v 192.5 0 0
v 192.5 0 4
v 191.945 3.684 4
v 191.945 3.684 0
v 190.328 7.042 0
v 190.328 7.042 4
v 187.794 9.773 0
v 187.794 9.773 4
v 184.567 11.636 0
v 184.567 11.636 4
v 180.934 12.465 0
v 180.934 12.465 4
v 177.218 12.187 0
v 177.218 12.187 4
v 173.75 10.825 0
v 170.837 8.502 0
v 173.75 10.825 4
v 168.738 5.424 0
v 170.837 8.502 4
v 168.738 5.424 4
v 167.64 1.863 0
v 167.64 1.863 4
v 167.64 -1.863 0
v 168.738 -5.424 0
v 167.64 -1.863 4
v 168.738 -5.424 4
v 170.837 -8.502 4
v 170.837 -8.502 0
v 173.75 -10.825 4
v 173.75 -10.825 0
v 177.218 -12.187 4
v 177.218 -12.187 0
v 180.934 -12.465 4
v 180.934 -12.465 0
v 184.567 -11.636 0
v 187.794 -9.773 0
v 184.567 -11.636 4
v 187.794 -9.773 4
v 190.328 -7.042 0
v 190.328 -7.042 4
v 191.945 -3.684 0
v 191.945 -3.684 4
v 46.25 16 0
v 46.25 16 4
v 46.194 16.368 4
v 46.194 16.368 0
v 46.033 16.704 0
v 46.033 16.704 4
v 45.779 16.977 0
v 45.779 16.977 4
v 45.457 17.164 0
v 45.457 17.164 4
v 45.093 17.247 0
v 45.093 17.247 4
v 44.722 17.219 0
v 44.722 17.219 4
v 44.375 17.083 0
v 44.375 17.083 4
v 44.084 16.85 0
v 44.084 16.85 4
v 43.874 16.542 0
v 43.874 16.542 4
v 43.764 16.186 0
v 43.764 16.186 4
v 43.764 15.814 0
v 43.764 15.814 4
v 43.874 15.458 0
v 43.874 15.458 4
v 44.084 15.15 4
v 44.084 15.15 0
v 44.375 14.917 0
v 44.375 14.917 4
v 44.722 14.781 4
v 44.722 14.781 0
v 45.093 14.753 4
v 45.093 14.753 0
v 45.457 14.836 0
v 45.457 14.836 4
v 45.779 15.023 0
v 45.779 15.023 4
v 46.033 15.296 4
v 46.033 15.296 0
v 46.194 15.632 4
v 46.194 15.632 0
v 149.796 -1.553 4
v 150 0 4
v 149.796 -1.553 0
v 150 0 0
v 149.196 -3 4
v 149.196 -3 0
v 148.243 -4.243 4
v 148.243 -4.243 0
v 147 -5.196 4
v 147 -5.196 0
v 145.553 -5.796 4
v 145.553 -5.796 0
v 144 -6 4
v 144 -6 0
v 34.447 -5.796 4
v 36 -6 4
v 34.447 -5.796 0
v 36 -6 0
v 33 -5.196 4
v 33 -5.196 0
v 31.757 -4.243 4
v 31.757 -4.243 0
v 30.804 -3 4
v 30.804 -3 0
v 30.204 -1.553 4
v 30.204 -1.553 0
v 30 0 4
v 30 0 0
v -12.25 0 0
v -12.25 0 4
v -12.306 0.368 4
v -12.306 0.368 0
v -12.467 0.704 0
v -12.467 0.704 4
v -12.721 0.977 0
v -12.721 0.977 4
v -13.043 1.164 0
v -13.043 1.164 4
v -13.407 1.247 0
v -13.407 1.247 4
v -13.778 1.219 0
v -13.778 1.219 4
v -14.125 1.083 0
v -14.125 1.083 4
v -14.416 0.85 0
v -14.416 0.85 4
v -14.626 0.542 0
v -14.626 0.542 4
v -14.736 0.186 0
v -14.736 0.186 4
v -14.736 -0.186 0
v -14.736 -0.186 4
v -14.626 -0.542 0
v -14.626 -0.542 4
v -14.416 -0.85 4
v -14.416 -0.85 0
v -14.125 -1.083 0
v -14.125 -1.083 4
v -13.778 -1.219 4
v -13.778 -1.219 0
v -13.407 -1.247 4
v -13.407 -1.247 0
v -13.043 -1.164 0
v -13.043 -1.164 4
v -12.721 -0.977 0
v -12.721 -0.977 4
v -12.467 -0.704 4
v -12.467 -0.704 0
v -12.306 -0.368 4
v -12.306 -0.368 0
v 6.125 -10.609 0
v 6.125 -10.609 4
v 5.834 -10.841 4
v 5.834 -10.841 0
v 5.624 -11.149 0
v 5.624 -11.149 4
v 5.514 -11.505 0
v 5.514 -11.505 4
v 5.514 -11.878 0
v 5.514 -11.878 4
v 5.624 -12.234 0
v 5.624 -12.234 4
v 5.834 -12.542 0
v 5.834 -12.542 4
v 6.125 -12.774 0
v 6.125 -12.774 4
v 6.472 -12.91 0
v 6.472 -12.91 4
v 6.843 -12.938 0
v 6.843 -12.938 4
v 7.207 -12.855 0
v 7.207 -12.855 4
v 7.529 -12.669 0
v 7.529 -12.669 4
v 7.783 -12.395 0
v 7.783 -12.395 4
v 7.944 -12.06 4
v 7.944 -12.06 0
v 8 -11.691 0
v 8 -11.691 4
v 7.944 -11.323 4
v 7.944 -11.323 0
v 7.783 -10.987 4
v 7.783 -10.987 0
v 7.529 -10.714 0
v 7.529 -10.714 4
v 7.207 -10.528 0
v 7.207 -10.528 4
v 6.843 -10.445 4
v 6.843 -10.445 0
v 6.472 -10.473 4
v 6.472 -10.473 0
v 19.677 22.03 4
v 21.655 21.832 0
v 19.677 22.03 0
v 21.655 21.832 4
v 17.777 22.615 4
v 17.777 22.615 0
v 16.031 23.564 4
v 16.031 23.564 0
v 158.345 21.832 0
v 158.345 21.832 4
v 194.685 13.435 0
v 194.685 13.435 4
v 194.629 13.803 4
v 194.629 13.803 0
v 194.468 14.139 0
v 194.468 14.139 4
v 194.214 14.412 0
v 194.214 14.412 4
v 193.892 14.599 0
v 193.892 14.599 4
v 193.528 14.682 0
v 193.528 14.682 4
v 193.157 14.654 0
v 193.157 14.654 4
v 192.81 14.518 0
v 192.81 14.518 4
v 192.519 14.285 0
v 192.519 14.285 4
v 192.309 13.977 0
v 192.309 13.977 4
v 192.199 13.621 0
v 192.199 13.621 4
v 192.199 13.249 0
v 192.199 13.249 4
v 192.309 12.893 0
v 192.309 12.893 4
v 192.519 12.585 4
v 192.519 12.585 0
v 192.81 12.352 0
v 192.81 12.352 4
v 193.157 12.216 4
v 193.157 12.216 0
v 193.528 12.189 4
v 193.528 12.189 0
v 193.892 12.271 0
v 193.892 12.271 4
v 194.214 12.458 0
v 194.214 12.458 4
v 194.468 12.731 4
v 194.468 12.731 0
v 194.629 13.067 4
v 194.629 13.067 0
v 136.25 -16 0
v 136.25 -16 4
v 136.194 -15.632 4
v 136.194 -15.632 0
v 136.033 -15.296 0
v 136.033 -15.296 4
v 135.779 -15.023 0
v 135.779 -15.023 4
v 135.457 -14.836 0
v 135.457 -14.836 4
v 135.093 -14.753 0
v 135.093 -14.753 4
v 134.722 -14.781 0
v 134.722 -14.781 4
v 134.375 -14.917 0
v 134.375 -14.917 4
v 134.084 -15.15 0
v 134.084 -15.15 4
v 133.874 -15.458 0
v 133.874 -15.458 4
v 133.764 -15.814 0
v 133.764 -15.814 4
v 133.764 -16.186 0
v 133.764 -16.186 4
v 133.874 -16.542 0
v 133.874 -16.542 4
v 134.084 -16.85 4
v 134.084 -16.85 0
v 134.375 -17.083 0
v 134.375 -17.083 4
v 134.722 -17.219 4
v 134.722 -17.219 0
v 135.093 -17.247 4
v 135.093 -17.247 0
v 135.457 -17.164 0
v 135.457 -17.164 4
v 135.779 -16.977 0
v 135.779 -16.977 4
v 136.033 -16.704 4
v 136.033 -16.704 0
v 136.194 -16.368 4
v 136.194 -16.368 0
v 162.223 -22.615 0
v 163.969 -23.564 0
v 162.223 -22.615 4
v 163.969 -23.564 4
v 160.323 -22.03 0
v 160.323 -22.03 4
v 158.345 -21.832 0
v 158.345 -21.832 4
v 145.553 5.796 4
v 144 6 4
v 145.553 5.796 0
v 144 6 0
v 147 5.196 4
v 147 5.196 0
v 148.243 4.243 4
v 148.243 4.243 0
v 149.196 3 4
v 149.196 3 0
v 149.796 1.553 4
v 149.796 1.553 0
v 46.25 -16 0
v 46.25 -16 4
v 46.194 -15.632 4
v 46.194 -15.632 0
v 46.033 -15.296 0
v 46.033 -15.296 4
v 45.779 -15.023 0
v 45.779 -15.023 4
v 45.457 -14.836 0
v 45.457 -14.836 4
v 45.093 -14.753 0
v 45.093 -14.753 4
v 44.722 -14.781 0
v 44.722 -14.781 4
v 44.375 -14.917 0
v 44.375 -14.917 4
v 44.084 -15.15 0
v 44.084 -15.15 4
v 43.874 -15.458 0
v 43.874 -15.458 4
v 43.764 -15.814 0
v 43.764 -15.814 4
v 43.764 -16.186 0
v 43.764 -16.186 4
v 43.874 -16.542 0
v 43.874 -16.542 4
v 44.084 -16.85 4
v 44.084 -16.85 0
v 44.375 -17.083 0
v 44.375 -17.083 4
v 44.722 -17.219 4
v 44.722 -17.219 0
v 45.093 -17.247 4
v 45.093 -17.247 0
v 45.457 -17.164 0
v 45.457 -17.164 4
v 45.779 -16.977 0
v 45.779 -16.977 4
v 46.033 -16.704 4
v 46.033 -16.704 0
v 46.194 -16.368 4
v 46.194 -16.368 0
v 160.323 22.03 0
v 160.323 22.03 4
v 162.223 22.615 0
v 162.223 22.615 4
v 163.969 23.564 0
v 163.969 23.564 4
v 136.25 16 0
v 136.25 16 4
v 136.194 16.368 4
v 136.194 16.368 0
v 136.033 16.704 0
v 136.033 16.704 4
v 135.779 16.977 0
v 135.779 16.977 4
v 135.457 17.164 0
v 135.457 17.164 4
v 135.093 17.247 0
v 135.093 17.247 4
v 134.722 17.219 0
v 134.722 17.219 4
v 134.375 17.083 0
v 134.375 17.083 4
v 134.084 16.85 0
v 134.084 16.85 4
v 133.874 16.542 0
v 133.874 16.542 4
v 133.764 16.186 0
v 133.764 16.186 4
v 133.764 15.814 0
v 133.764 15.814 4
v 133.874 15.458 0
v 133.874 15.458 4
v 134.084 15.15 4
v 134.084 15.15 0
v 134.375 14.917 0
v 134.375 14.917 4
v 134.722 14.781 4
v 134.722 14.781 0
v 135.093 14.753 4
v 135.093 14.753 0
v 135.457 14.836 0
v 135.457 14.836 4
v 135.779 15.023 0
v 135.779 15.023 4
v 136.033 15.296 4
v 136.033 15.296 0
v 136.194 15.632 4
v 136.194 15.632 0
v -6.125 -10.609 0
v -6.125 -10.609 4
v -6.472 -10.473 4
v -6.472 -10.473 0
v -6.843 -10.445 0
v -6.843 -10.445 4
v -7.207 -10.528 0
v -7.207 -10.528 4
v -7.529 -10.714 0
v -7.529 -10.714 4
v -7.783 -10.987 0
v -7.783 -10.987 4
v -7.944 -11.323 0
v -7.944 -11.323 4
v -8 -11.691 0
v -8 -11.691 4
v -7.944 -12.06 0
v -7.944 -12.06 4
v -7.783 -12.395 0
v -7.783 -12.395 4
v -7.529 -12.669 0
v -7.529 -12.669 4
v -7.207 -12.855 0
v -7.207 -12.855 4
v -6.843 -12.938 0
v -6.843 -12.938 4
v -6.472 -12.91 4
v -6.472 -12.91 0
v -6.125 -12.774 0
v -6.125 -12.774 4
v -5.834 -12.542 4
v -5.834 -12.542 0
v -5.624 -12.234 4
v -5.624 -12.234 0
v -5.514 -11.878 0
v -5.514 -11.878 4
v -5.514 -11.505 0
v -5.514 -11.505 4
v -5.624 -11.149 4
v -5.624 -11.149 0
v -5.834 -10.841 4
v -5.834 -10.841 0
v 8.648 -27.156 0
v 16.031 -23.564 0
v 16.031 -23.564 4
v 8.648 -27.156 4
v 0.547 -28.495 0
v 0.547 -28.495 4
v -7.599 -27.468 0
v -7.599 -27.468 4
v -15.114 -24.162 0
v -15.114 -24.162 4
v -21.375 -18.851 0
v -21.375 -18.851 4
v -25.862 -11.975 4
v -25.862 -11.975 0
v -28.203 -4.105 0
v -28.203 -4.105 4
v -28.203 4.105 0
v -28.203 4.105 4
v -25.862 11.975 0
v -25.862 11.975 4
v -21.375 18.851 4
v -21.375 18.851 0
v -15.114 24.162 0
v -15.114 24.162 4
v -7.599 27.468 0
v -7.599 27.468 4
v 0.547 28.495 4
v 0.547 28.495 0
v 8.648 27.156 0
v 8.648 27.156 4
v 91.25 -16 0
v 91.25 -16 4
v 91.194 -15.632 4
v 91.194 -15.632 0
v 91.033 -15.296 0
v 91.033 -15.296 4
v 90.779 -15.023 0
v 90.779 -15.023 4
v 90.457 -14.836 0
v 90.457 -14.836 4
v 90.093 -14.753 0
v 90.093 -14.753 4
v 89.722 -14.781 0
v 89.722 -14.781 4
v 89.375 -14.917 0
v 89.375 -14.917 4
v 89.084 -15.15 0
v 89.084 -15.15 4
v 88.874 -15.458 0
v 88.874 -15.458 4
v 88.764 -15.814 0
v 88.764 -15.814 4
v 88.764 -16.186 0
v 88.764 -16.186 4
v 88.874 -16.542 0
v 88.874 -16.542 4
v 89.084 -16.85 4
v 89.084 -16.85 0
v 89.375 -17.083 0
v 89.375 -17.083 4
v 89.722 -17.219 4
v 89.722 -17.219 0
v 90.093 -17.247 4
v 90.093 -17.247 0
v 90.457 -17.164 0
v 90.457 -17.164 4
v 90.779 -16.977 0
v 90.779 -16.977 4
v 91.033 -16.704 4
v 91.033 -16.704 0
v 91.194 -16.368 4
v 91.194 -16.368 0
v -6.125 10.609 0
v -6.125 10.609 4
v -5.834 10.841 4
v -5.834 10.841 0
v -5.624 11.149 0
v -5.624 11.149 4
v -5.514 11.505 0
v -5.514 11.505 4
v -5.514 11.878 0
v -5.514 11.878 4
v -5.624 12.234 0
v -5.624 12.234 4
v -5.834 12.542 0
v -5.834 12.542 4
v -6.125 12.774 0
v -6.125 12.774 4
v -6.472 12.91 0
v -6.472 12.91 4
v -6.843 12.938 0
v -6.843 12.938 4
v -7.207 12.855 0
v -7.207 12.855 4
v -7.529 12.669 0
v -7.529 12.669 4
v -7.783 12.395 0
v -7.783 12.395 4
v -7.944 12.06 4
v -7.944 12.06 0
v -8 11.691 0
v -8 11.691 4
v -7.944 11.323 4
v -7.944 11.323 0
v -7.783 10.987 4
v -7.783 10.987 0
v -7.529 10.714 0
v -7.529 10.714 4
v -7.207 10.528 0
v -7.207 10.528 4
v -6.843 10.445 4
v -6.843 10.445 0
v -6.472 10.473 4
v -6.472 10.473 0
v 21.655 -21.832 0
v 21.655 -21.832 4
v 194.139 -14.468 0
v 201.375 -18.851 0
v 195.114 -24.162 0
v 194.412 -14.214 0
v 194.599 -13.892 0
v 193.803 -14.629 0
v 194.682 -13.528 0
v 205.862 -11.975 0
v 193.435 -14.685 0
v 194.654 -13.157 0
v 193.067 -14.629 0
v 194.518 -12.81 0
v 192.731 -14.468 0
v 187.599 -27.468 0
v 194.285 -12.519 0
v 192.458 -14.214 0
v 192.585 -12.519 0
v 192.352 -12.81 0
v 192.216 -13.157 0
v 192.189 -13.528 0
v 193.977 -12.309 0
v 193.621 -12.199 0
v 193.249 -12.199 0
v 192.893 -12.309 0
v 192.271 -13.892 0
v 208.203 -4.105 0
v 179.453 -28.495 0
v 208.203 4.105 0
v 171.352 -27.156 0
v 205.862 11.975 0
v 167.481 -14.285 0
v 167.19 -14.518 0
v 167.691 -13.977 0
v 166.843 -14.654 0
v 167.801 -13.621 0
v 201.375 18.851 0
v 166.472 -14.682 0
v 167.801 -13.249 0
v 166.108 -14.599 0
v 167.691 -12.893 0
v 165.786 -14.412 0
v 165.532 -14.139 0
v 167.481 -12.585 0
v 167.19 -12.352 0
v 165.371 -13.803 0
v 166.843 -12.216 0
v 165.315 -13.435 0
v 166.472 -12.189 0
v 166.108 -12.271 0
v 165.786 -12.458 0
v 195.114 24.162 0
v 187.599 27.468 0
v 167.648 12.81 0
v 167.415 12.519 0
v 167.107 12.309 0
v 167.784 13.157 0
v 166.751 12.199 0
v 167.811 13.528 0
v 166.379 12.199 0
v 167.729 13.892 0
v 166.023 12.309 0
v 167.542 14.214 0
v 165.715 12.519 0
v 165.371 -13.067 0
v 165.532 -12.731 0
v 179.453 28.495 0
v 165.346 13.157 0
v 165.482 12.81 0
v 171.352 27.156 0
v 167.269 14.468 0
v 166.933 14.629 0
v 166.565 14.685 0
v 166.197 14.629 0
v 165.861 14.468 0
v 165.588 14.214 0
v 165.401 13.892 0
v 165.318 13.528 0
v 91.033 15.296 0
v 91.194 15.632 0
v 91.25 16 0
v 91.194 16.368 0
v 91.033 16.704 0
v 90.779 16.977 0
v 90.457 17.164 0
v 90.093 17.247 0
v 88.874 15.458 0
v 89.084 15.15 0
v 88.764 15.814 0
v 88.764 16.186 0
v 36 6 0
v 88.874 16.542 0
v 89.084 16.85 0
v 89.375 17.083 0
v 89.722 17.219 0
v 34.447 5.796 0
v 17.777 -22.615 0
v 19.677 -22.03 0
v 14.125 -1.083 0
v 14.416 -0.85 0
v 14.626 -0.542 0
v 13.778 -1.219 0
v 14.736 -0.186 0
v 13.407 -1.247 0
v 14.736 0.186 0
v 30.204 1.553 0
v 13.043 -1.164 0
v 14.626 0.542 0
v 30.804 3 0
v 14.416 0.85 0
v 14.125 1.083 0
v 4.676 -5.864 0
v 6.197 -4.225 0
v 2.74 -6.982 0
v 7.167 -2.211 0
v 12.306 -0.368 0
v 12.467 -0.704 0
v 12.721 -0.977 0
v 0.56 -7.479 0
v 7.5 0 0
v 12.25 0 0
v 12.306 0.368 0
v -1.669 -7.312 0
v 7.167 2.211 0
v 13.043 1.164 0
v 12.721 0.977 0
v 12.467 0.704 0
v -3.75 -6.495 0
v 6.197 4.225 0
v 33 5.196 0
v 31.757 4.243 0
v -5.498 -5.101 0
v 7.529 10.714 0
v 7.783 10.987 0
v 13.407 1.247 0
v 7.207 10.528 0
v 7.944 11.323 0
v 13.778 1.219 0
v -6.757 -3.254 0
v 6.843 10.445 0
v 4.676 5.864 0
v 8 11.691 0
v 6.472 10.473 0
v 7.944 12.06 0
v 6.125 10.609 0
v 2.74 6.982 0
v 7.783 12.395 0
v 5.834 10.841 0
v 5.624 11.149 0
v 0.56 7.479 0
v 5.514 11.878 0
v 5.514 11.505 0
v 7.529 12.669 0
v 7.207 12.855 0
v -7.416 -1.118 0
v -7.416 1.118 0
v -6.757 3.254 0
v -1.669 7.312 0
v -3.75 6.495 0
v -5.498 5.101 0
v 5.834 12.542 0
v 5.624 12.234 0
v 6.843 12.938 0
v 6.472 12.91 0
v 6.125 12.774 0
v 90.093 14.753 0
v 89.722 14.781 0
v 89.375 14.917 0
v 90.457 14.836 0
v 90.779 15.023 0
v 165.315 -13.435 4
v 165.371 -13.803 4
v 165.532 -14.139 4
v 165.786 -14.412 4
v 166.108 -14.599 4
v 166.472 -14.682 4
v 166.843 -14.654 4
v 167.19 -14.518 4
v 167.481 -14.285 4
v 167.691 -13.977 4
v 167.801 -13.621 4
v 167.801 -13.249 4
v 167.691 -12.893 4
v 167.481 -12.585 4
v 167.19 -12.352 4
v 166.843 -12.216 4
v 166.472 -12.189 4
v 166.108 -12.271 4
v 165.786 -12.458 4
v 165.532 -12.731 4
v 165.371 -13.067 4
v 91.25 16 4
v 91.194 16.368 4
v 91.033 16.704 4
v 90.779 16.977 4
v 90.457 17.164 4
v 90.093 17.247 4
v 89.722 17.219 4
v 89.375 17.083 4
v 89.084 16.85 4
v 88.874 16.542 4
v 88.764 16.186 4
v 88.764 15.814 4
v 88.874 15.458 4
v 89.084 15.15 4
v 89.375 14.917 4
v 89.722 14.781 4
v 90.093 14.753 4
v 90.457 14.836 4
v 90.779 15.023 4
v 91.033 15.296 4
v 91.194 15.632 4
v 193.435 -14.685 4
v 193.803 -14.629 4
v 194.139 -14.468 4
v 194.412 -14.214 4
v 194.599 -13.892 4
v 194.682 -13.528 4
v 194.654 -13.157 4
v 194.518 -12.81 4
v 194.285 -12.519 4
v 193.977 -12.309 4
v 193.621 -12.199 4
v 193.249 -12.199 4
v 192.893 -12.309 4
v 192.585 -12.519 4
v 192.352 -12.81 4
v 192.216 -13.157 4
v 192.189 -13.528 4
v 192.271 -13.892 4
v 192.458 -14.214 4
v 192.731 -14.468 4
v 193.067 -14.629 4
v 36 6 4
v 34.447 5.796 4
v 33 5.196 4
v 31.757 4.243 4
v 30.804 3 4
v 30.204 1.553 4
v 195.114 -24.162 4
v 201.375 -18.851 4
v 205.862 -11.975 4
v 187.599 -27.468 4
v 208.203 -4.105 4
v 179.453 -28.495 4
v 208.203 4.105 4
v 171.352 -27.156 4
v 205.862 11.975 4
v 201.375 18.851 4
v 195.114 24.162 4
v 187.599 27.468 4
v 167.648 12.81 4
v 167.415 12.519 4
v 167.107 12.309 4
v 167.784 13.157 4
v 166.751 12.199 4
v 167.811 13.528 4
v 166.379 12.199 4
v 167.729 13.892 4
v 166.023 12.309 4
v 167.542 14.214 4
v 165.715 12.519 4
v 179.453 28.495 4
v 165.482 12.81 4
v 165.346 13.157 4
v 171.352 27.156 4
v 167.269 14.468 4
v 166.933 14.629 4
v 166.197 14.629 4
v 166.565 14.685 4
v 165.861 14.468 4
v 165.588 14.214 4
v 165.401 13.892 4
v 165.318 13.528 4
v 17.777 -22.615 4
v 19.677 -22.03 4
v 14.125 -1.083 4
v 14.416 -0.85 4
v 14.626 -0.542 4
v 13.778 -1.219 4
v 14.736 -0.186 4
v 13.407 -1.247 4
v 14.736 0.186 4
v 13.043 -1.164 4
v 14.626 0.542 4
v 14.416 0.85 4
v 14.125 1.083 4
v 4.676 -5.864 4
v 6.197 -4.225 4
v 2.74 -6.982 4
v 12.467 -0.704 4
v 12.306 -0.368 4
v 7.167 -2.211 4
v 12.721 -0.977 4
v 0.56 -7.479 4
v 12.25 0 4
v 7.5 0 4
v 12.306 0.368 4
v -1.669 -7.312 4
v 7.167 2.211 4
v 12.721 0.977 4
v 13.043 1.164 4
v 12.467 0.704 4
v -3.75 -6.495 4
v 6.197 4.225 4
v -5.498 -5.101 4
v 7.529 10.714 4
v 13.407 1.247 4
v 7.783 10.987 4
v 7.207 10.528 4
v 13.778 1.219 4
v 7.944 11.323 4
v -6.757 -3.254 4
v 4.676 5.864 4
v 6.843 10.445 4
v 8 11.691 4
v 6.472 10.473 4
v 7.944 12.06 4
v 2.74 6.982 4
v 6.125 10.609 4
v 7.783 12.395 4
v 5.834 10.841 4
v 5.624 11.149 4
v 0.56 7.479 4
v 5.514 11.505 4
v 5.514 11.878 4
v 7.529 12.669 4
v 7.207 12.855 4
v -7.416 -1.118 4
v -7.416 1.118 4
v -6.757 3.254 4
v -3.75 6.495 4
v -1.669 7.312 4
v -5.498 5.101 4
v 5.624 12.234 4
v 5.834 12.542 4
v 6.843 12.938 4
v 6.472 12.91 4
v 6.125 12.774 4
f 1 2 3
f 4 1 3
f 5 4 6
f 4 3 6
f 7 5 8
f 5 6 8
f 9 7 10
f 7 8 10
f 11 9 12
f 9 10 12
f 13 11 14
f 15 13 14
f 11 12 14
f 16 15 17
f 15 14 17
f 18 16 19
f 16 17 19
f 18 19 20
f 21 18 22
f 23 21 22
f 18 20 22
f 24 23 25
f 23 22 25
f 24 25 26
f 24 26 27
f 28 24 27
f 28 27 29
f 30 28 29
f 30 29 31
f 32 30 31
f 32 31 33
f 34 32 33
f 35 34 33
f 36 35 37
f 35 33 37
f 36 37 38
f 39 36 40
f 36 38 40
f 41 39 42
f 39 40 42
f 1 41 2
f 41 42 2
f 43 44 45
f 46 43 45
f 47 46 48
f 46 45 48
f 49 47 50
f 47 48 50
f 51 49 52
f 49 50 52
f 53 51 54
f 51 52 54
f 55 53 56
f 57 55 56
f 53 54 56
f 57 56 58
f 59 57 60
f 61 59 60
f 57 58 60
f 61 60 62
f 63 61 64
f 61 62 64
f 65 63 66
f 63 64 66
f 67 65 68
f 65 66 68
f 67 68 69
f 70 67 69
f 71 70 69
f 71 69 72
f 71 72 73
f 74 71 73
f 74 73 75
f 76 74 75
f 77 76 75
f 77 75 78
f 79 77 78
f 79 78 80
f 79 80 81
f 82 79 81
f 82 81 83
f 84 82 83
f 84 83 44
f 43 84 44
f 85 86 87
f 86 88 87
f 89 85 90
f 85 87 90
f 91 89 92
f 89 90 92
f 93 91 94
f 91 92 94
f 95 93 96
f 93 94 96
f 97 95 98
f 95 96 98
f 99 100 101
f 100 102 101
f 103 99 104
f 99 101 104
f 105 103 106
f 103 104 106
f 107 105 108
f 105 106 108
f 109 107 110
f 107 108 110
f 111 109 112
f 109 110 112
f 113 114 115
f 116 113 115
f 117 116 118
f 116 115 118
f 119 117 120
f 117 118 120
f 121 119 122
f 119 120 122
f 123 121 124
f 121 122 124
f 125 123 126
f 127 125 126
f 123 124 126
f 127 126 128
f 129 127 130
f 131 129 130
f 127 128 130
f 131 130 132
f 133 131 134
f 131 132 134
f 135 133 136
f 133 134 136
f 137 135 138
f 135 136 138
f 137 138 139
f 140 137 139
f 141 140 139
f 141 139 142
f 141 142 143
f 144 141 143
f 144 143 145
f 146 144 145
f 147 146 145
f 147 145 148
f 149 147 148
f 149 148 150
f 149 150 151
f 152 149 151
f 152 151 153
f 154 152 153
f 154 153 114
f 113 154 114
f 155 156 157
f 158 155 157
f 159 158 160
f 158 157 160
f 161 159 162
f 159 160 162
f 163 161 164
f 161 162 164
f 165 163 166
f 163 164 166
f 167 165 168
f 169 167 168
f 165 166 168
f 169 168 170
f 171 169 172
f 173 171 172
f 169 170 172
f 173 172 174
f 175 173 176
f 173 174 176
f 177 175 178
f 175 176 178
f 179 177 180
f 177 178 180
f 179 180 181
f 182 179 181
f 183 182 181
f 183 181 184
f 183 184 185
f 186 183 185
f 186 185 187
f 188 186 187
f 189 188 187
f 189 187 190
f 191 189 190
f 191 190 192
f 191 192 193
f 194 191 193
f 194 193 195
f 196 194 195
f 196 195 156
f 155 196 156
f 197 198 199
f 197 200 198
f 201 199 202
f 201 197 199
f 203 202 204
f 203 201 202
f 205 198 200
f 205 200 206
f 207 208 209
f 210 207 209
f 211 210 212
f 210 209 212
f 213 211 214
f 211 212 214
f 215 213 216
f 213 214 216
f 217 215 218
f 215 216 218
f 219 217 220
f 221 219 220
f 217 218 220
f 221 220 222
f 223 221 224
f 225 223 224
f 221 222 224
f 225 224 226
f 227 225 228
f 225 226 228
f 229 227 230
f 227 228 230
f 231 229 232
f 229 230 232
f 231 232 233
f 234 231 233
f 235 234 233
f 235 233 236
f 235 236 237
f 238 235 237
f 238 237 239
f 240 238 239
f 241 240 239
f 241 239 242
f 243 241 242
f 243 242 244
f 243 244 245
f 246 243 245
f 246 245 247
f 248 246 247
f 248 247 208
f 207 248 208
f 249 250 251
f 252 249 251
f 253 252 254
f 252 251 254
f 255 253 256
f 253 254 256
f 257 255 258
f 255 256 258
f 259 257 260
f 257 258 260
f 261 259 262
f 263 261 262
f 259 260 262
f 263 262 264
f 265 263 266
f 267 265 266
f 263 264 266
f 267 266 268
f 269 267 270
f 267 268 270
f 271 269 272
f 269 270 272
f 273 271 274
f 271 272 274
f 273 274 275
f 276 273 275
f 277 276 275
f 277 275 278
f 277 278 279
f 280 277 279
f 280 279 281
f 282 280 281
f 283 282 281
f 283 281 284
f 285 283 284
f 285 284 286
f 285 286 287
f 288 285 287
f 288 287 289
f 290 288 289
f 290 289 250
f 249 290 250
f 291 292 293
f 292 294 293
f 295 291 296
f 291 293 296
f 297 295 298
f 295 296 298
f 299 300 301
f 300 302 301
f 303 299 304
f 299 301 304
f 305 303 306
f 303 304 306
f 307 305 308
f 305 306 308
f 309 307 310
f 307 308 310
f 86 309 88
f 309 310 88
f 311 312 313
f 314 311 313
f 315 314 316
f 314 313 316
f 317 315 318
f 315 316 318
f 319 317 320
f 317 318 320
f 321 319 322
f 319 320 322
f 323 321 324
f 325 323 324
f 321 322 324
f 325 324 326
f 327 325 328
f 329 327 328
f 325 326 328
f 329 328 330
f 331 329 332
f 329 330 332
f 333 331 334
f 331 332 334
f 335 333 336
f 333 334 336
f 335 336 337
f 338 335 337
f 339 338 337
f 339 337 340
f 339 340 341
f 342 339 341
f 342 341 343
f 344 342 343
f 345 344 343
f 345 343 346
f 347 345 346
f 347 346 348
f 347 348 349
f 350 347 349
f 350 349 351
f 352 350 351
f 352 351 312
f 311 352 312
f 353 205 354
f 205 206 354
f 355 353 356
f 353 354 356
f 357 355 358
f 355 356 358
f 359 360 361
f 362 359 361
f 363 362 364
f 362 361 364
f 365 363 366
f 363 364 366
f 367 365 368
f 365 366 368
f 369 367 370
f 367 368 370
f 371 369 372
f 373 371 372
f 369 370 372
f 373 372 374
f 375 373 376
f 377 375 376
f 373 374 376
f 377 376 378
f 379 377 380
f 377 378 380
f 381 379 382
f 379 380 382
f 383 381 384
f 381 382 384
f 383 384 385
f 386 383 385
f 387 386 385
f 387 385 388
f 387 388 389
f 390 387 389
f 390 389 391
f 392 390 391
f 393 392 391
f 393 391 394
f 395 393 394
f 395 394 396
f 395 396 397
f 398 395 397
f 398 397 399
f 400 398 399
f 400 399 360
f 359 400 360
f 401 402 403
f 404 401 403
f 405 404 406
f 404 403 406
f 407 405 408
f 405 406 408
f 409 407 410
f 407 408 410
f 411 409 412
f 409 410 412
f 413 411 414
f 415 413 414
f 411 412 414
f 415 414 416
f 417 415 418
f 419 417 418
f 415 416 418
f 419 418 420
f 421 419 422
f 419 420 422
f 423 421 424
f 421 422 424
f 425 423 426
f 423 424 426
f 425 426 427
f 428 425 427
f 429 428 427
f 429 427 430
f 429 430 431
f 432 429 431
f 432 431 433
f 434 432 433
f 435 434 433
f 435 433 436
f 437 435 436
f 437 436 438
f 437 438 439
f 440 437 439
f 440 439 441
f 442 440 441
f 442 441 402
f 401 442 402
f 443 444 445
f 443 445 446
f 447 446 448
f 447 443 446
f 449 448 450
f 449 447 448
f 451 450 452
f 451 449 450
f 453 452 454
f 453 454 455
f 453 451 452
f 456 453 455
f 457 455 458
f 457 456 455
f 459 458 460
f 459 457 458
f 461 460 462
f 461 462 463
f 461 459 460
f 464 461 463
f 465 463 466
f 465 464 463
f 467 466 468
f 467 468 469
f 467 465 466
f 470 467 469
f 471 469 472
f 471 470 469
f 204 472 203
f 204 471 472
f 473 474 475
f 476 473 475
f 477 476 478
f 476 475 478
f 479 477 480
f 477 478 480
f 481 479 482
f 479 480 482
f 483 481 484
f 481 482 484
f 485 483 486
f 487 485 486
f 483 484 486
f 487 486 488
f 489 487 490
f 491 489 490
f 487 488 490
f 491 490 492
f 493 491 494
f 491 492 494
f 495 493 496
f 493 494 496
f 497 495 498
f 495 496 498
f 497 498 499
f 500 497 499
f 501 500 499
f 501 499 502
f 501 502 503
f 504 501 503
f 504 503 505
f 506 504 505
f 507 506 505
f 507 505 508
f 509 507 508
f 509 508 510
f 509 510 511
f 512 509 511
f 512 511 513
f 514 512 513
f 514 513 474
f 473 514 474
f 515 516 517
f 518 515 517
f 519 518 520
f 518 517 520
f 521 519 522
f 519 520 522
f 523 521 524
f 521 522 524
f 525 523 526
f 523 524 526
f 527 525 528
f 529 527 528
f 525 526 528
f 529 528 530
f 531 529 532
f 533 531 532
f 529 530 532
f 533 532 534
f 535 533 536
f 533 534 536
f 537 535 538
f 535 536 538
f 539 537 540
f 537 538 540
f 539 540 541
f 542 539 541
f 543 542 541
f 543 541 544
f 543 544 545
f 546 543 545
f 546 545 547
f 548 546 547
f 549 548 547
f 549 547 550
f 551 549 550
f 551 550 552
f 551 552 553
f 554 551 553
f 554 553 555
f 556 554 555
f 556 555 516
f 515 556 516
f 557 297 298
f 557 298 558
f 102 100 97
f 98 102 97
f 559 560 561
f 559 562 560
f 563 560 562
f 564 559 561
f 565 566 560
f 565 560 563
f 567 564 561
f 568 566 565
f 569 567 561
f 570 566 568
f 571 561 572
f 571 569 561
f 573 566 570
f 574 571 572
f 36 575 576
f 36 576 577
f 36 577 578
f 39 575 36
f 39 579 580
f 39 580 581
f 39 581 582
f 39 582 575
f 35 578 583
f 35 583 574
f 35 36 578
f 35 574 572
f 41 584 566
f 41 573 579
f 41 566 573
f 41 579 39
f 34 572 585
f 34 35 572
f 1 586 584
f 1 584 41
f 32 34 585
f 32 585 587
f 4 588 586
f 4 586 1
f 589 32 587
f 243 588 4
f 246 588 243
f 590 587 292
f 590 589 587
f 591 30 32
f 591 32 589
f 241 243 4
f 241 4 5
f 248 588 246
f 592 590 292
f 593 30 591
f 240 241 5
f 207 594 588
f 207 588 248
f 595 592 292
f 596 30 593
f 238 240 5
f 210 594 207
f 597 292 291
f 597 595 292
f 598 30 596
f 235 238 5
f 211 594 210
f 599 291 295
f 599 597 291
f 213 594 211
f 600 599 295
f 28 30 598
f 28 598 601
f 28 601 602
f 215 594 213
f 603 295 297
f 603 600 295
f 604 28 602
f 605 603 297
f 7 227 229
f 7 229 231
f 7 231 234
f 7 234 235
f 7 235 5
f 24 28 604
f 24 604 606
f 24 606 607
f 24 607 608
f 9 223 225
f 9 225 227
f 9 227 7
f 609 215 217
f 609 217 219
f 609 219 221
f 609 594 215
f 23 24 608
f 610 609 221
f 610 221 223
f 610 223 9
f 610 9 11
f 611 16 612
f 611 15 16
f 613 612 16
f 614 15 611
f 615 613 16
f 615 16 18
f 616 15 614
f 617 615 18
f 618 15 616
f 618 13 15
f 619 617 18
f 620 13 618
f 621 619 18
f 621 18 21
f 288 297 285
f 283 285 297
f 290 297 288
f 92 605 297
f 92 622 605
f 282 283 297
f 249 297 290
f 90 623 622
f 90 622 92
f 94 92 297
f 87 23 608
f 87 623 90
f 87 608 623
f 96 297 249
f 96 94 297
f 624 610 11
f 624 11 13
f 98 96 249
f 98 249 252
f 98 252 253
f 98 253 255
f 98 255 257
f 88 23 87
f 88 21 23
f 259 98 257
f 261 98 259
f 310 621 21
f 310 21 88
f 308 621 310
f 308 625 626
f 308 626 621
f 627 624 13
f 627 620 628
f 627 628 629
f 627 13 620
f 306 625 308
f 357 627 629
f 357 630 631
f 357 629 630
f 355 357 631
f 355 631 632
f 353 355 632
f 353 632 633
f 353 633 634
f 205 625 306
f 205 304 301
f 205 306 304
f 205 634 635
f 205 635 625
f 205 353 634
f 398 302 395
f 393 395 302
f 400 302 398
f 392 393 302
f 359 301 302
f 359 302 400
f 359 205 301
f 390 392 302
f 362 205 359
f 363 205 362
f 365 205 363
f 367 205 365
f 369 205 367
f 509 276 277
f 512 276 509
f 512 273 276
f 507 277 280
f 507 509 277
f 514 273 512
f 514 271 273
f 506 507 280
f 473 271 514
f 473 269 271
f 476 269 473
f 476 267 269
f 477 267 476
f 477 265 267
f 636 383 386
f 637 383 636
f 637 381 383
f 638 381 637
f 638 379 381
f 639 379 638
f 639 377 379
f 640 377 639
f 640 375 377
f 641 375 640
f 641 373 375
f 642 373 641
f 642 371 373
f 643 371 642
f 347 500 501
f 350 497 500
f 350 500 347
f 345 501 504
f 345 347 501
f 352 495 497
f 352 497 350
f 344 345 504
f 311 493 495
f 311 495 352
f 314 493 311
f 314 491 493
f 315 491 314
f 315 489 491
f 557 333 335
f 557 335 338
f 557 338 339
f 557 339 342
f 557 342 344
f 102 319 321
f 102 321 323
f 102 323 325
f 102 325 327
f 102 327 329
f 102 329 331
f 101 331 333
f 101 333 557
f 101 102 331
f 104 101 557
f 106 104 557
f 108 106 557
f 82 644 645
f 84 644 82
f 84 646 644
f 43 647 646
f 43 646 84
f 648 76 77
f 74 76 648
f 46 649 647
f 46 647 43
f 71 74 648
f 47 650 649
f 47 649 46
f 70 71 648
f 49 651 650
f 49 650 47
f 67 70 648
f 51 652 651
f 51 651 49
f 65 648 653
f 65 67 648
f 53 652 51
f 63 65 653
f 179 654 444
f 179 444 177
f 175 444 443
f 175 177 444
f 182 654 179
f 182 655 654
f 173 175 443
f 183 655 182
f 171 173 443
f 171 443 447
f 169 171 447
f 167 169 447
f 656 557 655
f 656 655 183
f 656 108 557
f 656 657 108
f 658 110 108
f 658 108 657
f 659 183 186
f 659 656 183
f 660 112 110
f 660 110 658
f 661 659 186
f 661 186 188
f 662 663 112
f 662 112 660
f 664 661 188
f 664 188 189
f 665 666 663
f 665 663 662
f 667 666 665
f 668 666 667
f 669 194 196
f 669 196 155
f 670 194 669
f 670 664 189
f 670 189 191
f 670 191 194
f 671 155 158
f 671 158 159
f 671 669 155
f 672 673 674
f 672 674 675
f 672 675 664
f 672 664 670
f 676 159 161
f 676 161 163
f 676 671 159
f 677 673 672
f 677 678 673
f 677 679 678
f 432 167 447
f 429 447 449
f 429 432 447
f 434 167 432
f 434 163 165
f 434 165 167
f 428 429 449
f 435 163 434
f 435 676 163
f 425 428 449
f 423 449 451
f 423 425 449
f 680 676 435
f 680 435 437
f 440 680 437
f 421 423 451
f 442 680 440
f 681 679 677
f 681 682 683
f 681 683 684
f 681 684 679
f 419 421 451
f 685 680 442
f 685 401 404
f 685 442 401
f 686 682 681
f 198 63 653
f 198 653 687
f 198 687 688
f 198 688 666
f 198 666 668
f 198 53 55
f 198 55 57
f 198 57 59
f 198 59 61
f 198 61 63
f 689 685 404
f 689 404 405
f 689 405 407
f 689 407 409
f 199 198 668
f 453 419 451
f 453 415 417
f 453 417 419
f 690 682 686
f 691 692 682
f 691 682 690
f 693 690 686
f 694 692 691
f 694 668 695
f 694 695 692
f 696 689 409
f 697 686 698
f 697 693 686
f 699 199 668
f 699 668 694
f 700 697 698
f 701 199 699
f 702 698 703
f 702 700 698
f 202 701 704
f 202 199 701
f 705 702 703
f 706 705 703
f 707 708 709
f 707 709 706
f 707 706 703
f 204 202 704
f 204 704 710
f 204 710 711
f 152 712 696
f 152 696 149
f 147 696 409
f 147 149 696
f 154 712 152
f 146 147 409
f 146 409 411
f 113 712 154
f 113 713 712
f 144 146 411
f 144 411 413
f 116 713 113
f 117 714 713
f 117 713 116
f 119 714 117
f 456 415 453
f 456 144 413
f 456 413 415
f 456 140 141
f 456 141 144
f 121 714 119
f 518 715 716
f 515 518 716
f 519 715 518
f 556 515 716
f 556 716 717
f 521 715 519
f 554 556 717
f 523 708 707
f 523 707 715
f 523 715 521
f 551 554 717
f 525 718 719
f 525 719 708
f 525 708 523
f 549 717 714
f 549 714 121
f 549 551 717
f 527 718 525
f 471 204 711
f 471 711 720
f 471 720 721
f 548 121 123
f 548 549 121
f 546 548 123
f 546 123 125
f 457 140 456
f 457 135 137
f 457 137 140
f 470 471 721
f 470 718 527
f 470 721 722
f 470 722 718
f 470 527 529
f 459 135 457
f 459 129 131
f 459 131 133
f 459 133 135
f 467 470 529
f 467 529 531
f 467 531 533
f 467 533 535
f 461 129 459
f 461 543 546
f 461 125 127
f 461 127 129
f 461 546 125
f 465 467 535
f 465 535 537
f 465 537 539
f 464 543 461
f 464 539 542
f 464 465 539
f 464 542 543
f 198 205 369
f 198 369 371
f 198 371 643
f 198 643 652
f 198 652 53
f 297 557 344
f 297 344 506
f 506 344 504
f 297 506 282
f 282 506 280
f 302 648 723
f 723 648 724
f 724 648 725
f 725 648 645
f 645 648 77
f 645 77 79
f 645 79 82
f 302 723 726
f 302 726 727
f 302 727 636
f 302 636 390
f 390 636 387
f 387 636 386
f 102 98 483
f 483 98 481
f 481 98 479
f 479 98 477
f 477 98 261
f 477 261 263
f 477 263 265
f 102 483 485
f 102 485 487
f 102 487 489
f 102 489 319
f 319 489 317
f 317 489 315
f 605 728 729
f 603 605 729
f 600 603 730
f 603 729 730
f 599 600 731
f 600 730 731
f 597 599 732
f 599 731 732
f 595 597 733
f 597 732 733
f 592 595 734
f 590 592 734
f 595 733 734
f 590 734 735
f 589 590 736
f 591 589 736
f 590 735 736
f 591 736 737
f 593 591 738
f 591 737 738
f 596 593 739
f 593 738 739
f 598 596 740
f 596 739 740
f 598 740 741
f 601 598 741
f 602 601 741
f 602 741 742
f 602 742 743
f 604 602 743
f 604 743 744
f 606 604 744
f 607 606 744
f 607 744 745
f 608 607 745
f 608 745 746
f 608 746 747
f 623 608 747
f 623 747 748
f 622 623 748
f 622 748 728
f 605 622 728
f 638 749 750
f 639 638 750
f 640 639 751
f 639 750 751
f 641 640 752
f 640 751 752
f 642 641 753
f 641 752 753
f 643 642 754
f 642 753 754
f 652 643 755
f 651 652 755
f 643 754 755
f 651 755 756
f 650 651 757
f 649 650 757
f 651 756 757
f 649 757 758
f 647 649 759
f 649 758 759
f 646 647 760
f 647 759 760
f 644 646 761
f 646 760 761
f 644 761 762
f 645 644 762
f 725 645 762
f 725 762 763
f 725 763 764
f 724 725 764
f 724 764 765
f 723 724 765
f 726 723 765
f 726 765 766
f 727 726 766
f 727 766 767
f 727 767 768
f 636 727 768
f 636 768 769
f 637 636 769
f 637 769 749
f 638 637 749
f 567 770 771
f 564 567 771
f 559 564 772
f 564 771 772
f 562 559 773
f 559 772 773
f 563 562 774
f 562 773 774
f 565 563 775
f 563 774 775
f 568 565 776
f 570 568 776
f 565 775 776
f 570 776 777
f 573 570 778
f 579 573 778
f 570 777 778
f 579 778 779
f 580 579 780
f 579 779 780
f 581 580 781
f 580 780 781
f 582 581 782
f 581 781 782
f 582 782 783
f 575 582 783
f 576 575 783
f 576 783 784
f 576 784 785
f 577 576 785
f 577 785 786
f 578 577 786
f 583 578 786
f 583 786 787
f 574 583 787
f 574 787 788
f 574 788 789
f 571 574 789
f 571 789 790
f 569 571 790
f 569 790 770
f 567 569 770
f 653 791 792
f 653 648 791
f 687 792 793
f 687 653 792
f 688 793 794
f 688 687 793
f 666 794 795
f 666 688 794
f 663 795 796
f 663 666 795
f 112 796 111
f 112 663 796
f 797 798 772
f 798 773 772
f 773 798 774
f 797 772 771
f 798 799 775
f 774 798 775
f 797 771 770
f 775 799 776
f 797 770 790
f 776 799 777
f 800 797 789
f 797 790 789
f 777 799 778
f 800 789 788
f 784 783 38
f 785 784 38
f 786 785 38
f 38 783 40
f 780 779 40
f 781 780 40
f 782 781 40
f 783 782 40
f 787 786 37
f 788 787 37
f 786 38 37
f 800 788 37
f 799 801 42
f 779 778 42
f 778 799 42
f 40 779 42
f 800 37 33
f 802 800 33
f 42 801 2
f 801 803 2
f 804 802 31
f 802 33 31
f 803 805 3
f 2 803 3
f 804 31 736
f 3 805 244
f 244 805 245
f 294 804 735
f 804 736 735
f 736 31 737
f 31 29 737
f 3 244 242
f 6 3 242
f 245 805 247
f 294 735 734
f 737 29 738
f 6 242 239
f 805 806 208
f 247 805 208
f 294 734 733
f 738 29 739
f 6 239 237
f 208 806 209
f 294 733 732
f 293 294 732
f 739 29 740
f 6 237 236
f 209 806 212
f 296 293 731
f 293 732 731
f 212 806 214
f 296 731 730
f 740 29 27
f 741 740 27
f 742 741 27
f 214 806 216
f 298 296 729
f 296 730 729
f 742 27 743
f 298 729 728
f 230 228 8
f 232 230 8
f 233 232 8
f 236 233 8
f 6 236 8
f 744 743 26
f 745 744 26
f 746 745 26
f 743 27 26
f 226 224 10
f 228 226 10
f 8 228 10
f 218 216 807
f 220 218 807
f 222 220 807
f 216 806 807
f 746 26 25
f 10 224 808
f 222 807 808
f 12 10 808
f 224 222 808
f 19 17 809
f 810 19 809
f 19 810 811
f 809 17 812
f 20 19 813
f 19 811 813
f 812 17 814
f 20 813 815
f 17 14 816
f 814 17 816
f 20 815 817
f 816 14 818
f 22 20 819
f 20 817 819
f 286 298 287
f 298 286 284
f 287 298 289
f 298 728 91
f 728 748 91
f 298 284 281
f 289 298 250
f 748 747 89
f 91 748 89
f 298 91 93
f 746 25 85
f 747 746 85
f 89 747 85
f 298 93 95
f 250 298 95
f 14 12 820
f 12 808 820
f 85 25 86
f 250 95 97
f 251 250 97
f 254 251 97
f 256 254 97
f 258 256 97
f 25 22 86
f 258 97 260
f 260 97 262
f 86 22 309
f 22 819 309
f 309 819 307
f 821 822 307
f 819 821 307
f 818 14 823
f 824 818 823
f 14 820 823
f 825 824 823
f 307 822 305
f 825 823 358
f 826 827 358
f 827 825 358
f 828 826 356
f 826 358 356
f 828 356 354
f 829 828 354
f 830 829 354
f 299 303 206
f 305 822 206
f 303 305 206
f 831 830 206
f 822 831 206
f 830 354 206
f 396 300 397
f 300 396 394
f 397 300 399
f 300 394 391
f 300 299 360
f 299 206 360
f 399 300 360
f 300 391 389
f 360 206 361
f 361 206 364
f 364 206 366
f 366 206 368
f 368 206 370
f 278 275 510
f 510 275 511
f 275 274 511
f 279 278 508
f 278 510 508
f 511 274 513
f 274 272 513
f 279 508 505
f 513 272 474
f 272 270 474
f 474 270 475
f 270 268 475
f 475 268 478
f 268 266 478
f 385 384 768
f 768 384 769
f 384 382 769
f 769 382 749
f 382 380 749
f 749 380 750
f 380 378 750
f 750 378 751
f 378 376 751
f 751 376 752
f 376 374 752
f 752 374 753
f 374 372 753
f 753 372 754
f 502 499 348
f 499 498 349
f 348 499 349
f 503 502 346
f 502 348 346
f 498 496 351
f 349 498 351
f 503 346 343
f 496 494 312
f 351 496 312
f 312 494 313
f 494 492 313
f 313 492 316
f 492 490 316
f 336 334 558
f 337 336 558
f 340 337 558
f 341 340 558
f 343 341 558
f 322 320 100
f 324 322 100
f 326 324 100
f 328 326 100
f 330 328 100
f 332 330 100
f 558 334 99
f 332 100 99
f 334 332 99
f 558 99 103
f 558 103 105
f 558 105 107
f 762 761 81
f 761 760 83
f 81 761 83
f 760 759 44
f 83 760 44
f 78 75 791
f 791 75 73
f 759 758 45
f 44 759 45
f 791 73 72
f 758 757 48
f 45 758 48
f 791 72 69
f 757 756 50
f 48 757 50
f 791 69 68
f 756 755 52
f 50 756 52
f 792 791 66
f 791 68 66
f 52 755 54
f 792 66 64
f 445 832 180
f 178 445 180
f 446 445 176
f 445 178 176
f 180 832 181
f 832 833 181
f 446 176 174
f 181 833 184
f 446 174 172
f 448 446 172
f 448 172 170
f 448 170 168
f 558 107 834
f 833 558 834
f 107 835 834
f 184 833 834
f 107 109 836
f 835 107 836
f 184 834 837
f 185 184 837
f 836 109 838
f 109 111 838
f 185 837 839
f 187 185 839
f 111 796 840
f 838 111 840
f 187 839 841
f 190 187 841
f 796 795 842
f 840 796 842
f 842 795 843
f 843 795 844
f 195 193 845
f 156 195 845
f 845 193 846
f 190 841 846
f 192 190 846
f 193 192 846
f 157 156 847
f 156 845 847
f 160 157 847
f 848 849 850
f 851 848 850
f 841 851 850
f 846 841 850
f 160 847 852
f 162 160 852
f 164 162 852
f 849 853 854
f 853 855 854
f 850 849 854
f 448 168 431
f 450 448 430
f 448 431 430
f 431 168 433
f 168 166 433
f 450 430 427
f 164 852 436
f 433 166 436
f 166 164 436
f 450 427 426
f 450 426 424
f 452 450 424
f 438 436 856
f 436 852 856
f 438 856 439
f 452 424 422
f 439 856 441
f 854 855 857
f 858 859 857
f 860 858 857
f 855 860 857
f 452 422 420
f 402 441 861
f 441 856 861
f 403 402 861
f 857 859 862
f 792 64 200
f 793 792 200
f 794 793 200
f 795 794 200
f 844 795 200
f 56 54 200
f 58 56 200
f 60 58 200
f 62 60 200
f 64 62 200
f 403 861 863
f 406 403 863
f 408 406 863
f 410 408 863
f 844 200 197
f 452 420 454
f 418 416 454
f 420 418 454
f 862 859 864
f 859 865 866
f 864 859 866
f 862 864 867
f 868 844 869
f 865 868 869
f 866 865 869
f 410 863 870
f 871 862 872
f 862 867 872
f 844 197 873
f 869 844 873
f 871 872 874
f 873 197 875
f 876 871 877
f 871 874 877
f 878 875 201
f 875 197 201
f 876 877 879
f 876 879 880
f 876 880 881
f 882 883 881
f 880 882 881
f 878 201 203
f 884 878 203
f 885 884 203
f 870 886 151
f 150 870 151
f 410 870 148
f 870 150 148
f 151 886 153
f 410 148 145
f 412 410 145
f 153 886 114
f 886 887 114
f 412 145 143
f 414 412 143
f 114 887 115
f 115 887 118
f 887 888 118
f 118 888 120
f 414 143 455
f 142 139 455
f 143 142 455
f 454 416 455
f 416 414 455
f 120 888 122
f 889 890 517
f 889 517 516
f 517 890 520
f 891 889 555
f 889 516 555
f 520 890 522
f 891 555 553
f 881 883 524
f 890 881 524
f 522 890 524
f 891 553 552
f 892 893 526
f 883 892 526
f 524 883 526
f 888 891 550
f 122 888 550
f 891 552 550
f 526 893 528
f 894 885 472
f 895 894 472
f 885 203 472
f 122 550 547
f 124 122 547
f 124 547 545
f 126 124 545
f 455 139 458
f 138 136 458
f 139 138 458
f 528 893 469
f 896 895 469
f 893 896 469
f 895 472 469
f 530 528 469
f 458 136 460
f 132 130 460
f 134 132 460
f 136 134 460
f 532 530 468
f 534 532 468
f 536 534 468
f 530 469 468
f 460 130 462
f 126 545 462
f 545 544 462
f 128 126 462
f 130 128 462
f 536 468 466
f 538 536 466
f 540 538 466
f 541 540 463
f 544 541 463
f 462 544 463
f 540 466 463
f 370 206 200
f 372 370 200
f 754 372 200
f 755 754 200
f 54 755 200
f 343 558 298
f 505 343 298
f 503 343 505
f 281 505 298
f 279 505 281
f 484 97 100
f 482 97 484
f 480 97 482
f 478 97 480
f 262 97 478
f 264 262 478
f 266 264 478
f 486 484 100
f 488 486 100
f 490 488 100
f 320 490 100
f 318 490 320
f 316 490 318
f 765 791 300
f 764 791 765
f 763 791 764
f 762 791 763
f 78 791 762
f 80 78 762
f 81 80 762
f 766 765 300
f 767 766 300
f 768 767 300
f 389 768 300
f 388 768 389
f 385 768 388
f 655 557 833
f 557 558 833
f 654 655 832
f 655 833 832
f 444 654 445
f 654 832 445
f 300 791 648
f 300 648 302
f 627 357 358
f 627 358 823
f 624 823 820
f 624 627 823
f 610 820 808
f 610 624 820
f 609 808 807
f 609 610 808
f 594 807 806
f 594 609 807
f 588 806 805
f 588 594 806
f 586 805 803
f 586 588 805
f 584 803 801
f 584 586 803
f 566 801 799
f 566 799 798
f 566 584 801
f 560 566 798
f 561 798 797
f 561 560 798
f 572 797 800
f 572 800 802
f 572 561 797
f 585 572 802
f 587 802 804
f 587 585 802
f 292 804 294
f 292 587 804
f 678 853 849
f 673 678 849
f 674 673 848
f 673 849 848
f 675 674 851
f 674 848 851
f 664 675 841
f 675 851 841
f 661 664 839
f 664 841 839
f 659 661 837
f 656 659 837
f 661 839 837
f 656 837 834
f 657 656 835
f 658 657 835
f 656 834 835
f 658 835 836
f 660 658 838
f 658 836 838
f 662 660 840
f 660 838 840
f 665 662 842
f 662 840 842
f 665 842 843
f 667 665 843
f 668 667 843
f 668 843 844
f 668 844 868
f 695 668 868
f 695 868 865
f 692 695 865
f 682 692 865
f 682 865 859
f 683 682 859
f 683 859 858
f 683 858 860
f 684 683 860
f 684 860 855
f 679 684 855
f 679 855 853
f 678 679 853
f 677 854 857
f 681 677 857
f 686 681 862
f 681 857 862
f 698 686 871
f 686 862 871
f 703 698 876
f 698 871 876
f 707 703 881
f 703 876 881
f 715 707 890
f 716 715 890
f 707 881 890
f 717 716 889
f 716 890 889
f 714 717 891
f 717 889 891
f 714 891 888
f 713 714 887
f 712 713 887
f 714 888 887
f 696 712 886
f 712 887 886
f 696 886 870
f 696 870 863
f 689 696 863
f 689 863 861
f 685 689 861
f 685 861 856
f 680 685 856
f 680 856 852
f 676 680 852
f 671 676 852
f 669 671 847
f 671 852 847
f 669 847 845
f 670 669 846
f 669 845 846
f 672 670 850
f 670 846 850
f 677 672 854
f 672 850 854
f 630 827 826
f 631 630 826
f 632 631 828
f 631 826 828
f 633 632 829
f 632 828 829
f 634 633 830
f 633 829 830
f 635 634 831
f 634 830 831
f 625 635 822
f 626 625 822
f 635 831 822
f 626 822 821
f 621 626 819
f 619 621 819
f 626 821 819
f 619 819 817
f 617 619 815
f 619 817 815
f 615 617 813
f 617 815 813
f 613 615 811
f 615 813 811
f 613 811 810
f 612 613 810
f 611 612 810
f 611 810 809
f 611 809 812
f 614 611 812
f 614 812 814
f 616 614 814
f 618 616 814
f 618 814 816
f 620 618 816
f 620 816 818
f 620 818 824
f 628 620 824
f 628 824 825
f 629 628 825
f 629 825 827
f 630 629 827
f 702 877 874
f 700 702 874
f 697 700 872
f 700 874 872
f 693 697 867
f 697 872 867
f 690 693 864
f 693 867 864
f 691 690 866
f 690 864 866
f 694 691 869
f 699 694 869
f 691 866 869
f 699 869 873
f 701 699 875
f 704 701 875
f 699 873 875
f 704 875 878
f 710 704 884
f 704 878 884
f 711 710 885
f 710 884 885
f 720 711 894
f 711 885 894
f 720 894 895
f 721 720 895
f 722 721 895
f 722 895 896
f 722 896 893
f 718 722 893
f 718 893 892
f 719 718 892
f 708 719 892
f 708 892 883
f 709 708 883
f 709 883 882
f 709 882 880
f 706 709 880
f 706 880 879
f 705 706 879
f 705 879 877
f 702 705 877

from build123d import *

# Parameters (mm, degrees)
EXTRUDE_1_DEPTH          = 4
FILLET_1_R               = 10
SKETCH_2_R               = 7.5
SKETCH_2_R_2             = 1.25
CUT_EXTRUDE_1_DEPTH      = 5
PATTERN_CIRCULAR_1_COUNT = 6
SKETCH_3_R               = 12.5
SKETCH_3_R_2             = 1.25
CUT_EXTRUDE_2_DEPTH      = 5
PATTERN_CIRCULAR_2_COUNT = 4
SKETCH_4_W               = 120
SKETCH_4_H               = 12
CUT_EXTRUDE_3_DEPTH      = 5
FILLET_2_R               = 6
FILLET_3_R               = 6
SKETCH_5_R               = 1.25
CUT_EXTRUDE_5_DEPTH      = 5
PATTERN_LINEAR_2_COUNT   = 3
PATTERN_LINEAR_2_PITCH   = 45


with BuildPart() as part:
    # 草图1 → 凸台-拉伸1 (new body)
    with BuildSketch(Plane.XY):
        with BuildLine():
            Line((18.319446876, 21.832266629), (161.680553124, 21.832266629))
            ThreePointArc((161.680553124, 21.832266629), (208.5, 0), (161.680553124, -21.832266629))
            Line((161.680553124, -21.832266629), (18.319446876, -21.832266629))
            ThreePointArc((18.319446876, -21.832266629), (-28.5, 0), (18.319446876, 21.832266629))
        make_face()
    extrude(amount=EXTRUDE_1_DEPTH)

    # 圆角1
    fillet_1_edges = [part.edges().sort_by_distance(p)[0] for p in [
        (18.319446876, 21.832266629, 2),
        (161.680553124, 21.832266629, 2),
        (161.680553124, -21.832266629, 2),
        (18.319446876, -21.832266629, 2),
    ]]
    fillet(fillet_1_edges, radius=FILLET_1_R)

    # 草图2 → 切除-拉伸1 (cut)
    with BuildSketch(Plane.XY.offset(4)):
        Circle(SKETCH_2_R)
        with Locations((-13.5, 0)):
            Circle(SKETCH_2_R_2)
    cut_extrude_1 = extrude(amount=-CUT_EXTRUDE_1_DEPTH, mode=Mode.SUBTRACT)

    # 阵列(圆周)1: 切除-拉伸1 ×6 about axis
    pattern_circular_1_axis = Axis((0, 0, 0), (0, 0, 1))
    for i in range(1, PATTERN_CIRCULAR_1_COUNT):
        add(cut_extrude_1.rotate(pattern_circular_1_axis, i * 360 / PATTERN_CIRCULAR_1_COUNT), mode=Mode.SUBTRACT)

    # 草图3 → 切除-拉伸2 (cut)
    with BuildSketch(Plane.XY.offset(4)):
        with Locations((180, 0)):
            Circle(SKETCH_3_R)
        with Locations((193.435028843, 13.435028843)):
            Circle(SKETCH_3_R_2)
    cut_extrude_2 = extrude(amount=-CUT_EXTRUDE_2_DEPTH, mode=Mode.SUBTRACT)

    # 阵列(圆周)2: 切除-拉伸2 ×4 about axis
    pattern_circular_2_axis = Axis((180, 0, 0), (0, 0, 1))
    for i in range(1, PATTERN_CIRCULAR_2_COUNT):
        add(cut_extrude_2.rotate(pattern_circular_2_axis, i * 360 / PATTERN_CIRCULAR_2_COUNT), mode=Mode.SUBTRACT)

    # 草图4 → 切除-拉伸3 (cut)
    with BuildSketch(Plane.XY.offset(4)):
        with Locations((90, 0)):
            Rectangle(SKETCH_4_W, SKETCH_4_H)
    extrude(amount=-CUT_EXTRUDE_3_DEPTH, mode=Mode.SUBTRACT)

    # 圆角2
    fillet_2_edges = [part.edges().sort_by_distance(p)[0] for p in [
        (30, 6, 2),
        (30, -6, 2),
    ]]
    fillet(fillet_2_edges, radius=FILLET_2_R - 0.0001)  # a hair under: the kernel refuses the full size

    # 圆角3
    fillet_3_edges = [part.edges().sort_by_distance(p)[0] for p in [
        (150, 6, 2),
        (150, -6, 2),
    ]]
    fillet(fillet_3_edges, radius=FILLET_3_R - 0.0001)  # a hair under: the kernel refuses the full size

    # 草图5 → 切除-拉伸5 (cut)
    with BuildSketch(Plane.XY.offset(4)):
        with Locations((45, 16)):
            Circle(SKETCH_5_R)
        with Locations((45, -16)):
            Circle(SKETCH_5_R)
    cut_extrude_5 = extrude(amount=-CUT_EXTRUDE_5_DEPTH, mode=Mode.SUBTRACT)

    # 阵列(线性)2: 切除-拉伸5 ×3
    with Locations(*[(i * PATTERN_LINEAR_2_PITCH, 0, 0) for i in range(1, PATTERN_LINEAR_2_COUNT)]):
        add(cut_extrude_5, mode=Mode.SUBTRACT)


solid = part.part
